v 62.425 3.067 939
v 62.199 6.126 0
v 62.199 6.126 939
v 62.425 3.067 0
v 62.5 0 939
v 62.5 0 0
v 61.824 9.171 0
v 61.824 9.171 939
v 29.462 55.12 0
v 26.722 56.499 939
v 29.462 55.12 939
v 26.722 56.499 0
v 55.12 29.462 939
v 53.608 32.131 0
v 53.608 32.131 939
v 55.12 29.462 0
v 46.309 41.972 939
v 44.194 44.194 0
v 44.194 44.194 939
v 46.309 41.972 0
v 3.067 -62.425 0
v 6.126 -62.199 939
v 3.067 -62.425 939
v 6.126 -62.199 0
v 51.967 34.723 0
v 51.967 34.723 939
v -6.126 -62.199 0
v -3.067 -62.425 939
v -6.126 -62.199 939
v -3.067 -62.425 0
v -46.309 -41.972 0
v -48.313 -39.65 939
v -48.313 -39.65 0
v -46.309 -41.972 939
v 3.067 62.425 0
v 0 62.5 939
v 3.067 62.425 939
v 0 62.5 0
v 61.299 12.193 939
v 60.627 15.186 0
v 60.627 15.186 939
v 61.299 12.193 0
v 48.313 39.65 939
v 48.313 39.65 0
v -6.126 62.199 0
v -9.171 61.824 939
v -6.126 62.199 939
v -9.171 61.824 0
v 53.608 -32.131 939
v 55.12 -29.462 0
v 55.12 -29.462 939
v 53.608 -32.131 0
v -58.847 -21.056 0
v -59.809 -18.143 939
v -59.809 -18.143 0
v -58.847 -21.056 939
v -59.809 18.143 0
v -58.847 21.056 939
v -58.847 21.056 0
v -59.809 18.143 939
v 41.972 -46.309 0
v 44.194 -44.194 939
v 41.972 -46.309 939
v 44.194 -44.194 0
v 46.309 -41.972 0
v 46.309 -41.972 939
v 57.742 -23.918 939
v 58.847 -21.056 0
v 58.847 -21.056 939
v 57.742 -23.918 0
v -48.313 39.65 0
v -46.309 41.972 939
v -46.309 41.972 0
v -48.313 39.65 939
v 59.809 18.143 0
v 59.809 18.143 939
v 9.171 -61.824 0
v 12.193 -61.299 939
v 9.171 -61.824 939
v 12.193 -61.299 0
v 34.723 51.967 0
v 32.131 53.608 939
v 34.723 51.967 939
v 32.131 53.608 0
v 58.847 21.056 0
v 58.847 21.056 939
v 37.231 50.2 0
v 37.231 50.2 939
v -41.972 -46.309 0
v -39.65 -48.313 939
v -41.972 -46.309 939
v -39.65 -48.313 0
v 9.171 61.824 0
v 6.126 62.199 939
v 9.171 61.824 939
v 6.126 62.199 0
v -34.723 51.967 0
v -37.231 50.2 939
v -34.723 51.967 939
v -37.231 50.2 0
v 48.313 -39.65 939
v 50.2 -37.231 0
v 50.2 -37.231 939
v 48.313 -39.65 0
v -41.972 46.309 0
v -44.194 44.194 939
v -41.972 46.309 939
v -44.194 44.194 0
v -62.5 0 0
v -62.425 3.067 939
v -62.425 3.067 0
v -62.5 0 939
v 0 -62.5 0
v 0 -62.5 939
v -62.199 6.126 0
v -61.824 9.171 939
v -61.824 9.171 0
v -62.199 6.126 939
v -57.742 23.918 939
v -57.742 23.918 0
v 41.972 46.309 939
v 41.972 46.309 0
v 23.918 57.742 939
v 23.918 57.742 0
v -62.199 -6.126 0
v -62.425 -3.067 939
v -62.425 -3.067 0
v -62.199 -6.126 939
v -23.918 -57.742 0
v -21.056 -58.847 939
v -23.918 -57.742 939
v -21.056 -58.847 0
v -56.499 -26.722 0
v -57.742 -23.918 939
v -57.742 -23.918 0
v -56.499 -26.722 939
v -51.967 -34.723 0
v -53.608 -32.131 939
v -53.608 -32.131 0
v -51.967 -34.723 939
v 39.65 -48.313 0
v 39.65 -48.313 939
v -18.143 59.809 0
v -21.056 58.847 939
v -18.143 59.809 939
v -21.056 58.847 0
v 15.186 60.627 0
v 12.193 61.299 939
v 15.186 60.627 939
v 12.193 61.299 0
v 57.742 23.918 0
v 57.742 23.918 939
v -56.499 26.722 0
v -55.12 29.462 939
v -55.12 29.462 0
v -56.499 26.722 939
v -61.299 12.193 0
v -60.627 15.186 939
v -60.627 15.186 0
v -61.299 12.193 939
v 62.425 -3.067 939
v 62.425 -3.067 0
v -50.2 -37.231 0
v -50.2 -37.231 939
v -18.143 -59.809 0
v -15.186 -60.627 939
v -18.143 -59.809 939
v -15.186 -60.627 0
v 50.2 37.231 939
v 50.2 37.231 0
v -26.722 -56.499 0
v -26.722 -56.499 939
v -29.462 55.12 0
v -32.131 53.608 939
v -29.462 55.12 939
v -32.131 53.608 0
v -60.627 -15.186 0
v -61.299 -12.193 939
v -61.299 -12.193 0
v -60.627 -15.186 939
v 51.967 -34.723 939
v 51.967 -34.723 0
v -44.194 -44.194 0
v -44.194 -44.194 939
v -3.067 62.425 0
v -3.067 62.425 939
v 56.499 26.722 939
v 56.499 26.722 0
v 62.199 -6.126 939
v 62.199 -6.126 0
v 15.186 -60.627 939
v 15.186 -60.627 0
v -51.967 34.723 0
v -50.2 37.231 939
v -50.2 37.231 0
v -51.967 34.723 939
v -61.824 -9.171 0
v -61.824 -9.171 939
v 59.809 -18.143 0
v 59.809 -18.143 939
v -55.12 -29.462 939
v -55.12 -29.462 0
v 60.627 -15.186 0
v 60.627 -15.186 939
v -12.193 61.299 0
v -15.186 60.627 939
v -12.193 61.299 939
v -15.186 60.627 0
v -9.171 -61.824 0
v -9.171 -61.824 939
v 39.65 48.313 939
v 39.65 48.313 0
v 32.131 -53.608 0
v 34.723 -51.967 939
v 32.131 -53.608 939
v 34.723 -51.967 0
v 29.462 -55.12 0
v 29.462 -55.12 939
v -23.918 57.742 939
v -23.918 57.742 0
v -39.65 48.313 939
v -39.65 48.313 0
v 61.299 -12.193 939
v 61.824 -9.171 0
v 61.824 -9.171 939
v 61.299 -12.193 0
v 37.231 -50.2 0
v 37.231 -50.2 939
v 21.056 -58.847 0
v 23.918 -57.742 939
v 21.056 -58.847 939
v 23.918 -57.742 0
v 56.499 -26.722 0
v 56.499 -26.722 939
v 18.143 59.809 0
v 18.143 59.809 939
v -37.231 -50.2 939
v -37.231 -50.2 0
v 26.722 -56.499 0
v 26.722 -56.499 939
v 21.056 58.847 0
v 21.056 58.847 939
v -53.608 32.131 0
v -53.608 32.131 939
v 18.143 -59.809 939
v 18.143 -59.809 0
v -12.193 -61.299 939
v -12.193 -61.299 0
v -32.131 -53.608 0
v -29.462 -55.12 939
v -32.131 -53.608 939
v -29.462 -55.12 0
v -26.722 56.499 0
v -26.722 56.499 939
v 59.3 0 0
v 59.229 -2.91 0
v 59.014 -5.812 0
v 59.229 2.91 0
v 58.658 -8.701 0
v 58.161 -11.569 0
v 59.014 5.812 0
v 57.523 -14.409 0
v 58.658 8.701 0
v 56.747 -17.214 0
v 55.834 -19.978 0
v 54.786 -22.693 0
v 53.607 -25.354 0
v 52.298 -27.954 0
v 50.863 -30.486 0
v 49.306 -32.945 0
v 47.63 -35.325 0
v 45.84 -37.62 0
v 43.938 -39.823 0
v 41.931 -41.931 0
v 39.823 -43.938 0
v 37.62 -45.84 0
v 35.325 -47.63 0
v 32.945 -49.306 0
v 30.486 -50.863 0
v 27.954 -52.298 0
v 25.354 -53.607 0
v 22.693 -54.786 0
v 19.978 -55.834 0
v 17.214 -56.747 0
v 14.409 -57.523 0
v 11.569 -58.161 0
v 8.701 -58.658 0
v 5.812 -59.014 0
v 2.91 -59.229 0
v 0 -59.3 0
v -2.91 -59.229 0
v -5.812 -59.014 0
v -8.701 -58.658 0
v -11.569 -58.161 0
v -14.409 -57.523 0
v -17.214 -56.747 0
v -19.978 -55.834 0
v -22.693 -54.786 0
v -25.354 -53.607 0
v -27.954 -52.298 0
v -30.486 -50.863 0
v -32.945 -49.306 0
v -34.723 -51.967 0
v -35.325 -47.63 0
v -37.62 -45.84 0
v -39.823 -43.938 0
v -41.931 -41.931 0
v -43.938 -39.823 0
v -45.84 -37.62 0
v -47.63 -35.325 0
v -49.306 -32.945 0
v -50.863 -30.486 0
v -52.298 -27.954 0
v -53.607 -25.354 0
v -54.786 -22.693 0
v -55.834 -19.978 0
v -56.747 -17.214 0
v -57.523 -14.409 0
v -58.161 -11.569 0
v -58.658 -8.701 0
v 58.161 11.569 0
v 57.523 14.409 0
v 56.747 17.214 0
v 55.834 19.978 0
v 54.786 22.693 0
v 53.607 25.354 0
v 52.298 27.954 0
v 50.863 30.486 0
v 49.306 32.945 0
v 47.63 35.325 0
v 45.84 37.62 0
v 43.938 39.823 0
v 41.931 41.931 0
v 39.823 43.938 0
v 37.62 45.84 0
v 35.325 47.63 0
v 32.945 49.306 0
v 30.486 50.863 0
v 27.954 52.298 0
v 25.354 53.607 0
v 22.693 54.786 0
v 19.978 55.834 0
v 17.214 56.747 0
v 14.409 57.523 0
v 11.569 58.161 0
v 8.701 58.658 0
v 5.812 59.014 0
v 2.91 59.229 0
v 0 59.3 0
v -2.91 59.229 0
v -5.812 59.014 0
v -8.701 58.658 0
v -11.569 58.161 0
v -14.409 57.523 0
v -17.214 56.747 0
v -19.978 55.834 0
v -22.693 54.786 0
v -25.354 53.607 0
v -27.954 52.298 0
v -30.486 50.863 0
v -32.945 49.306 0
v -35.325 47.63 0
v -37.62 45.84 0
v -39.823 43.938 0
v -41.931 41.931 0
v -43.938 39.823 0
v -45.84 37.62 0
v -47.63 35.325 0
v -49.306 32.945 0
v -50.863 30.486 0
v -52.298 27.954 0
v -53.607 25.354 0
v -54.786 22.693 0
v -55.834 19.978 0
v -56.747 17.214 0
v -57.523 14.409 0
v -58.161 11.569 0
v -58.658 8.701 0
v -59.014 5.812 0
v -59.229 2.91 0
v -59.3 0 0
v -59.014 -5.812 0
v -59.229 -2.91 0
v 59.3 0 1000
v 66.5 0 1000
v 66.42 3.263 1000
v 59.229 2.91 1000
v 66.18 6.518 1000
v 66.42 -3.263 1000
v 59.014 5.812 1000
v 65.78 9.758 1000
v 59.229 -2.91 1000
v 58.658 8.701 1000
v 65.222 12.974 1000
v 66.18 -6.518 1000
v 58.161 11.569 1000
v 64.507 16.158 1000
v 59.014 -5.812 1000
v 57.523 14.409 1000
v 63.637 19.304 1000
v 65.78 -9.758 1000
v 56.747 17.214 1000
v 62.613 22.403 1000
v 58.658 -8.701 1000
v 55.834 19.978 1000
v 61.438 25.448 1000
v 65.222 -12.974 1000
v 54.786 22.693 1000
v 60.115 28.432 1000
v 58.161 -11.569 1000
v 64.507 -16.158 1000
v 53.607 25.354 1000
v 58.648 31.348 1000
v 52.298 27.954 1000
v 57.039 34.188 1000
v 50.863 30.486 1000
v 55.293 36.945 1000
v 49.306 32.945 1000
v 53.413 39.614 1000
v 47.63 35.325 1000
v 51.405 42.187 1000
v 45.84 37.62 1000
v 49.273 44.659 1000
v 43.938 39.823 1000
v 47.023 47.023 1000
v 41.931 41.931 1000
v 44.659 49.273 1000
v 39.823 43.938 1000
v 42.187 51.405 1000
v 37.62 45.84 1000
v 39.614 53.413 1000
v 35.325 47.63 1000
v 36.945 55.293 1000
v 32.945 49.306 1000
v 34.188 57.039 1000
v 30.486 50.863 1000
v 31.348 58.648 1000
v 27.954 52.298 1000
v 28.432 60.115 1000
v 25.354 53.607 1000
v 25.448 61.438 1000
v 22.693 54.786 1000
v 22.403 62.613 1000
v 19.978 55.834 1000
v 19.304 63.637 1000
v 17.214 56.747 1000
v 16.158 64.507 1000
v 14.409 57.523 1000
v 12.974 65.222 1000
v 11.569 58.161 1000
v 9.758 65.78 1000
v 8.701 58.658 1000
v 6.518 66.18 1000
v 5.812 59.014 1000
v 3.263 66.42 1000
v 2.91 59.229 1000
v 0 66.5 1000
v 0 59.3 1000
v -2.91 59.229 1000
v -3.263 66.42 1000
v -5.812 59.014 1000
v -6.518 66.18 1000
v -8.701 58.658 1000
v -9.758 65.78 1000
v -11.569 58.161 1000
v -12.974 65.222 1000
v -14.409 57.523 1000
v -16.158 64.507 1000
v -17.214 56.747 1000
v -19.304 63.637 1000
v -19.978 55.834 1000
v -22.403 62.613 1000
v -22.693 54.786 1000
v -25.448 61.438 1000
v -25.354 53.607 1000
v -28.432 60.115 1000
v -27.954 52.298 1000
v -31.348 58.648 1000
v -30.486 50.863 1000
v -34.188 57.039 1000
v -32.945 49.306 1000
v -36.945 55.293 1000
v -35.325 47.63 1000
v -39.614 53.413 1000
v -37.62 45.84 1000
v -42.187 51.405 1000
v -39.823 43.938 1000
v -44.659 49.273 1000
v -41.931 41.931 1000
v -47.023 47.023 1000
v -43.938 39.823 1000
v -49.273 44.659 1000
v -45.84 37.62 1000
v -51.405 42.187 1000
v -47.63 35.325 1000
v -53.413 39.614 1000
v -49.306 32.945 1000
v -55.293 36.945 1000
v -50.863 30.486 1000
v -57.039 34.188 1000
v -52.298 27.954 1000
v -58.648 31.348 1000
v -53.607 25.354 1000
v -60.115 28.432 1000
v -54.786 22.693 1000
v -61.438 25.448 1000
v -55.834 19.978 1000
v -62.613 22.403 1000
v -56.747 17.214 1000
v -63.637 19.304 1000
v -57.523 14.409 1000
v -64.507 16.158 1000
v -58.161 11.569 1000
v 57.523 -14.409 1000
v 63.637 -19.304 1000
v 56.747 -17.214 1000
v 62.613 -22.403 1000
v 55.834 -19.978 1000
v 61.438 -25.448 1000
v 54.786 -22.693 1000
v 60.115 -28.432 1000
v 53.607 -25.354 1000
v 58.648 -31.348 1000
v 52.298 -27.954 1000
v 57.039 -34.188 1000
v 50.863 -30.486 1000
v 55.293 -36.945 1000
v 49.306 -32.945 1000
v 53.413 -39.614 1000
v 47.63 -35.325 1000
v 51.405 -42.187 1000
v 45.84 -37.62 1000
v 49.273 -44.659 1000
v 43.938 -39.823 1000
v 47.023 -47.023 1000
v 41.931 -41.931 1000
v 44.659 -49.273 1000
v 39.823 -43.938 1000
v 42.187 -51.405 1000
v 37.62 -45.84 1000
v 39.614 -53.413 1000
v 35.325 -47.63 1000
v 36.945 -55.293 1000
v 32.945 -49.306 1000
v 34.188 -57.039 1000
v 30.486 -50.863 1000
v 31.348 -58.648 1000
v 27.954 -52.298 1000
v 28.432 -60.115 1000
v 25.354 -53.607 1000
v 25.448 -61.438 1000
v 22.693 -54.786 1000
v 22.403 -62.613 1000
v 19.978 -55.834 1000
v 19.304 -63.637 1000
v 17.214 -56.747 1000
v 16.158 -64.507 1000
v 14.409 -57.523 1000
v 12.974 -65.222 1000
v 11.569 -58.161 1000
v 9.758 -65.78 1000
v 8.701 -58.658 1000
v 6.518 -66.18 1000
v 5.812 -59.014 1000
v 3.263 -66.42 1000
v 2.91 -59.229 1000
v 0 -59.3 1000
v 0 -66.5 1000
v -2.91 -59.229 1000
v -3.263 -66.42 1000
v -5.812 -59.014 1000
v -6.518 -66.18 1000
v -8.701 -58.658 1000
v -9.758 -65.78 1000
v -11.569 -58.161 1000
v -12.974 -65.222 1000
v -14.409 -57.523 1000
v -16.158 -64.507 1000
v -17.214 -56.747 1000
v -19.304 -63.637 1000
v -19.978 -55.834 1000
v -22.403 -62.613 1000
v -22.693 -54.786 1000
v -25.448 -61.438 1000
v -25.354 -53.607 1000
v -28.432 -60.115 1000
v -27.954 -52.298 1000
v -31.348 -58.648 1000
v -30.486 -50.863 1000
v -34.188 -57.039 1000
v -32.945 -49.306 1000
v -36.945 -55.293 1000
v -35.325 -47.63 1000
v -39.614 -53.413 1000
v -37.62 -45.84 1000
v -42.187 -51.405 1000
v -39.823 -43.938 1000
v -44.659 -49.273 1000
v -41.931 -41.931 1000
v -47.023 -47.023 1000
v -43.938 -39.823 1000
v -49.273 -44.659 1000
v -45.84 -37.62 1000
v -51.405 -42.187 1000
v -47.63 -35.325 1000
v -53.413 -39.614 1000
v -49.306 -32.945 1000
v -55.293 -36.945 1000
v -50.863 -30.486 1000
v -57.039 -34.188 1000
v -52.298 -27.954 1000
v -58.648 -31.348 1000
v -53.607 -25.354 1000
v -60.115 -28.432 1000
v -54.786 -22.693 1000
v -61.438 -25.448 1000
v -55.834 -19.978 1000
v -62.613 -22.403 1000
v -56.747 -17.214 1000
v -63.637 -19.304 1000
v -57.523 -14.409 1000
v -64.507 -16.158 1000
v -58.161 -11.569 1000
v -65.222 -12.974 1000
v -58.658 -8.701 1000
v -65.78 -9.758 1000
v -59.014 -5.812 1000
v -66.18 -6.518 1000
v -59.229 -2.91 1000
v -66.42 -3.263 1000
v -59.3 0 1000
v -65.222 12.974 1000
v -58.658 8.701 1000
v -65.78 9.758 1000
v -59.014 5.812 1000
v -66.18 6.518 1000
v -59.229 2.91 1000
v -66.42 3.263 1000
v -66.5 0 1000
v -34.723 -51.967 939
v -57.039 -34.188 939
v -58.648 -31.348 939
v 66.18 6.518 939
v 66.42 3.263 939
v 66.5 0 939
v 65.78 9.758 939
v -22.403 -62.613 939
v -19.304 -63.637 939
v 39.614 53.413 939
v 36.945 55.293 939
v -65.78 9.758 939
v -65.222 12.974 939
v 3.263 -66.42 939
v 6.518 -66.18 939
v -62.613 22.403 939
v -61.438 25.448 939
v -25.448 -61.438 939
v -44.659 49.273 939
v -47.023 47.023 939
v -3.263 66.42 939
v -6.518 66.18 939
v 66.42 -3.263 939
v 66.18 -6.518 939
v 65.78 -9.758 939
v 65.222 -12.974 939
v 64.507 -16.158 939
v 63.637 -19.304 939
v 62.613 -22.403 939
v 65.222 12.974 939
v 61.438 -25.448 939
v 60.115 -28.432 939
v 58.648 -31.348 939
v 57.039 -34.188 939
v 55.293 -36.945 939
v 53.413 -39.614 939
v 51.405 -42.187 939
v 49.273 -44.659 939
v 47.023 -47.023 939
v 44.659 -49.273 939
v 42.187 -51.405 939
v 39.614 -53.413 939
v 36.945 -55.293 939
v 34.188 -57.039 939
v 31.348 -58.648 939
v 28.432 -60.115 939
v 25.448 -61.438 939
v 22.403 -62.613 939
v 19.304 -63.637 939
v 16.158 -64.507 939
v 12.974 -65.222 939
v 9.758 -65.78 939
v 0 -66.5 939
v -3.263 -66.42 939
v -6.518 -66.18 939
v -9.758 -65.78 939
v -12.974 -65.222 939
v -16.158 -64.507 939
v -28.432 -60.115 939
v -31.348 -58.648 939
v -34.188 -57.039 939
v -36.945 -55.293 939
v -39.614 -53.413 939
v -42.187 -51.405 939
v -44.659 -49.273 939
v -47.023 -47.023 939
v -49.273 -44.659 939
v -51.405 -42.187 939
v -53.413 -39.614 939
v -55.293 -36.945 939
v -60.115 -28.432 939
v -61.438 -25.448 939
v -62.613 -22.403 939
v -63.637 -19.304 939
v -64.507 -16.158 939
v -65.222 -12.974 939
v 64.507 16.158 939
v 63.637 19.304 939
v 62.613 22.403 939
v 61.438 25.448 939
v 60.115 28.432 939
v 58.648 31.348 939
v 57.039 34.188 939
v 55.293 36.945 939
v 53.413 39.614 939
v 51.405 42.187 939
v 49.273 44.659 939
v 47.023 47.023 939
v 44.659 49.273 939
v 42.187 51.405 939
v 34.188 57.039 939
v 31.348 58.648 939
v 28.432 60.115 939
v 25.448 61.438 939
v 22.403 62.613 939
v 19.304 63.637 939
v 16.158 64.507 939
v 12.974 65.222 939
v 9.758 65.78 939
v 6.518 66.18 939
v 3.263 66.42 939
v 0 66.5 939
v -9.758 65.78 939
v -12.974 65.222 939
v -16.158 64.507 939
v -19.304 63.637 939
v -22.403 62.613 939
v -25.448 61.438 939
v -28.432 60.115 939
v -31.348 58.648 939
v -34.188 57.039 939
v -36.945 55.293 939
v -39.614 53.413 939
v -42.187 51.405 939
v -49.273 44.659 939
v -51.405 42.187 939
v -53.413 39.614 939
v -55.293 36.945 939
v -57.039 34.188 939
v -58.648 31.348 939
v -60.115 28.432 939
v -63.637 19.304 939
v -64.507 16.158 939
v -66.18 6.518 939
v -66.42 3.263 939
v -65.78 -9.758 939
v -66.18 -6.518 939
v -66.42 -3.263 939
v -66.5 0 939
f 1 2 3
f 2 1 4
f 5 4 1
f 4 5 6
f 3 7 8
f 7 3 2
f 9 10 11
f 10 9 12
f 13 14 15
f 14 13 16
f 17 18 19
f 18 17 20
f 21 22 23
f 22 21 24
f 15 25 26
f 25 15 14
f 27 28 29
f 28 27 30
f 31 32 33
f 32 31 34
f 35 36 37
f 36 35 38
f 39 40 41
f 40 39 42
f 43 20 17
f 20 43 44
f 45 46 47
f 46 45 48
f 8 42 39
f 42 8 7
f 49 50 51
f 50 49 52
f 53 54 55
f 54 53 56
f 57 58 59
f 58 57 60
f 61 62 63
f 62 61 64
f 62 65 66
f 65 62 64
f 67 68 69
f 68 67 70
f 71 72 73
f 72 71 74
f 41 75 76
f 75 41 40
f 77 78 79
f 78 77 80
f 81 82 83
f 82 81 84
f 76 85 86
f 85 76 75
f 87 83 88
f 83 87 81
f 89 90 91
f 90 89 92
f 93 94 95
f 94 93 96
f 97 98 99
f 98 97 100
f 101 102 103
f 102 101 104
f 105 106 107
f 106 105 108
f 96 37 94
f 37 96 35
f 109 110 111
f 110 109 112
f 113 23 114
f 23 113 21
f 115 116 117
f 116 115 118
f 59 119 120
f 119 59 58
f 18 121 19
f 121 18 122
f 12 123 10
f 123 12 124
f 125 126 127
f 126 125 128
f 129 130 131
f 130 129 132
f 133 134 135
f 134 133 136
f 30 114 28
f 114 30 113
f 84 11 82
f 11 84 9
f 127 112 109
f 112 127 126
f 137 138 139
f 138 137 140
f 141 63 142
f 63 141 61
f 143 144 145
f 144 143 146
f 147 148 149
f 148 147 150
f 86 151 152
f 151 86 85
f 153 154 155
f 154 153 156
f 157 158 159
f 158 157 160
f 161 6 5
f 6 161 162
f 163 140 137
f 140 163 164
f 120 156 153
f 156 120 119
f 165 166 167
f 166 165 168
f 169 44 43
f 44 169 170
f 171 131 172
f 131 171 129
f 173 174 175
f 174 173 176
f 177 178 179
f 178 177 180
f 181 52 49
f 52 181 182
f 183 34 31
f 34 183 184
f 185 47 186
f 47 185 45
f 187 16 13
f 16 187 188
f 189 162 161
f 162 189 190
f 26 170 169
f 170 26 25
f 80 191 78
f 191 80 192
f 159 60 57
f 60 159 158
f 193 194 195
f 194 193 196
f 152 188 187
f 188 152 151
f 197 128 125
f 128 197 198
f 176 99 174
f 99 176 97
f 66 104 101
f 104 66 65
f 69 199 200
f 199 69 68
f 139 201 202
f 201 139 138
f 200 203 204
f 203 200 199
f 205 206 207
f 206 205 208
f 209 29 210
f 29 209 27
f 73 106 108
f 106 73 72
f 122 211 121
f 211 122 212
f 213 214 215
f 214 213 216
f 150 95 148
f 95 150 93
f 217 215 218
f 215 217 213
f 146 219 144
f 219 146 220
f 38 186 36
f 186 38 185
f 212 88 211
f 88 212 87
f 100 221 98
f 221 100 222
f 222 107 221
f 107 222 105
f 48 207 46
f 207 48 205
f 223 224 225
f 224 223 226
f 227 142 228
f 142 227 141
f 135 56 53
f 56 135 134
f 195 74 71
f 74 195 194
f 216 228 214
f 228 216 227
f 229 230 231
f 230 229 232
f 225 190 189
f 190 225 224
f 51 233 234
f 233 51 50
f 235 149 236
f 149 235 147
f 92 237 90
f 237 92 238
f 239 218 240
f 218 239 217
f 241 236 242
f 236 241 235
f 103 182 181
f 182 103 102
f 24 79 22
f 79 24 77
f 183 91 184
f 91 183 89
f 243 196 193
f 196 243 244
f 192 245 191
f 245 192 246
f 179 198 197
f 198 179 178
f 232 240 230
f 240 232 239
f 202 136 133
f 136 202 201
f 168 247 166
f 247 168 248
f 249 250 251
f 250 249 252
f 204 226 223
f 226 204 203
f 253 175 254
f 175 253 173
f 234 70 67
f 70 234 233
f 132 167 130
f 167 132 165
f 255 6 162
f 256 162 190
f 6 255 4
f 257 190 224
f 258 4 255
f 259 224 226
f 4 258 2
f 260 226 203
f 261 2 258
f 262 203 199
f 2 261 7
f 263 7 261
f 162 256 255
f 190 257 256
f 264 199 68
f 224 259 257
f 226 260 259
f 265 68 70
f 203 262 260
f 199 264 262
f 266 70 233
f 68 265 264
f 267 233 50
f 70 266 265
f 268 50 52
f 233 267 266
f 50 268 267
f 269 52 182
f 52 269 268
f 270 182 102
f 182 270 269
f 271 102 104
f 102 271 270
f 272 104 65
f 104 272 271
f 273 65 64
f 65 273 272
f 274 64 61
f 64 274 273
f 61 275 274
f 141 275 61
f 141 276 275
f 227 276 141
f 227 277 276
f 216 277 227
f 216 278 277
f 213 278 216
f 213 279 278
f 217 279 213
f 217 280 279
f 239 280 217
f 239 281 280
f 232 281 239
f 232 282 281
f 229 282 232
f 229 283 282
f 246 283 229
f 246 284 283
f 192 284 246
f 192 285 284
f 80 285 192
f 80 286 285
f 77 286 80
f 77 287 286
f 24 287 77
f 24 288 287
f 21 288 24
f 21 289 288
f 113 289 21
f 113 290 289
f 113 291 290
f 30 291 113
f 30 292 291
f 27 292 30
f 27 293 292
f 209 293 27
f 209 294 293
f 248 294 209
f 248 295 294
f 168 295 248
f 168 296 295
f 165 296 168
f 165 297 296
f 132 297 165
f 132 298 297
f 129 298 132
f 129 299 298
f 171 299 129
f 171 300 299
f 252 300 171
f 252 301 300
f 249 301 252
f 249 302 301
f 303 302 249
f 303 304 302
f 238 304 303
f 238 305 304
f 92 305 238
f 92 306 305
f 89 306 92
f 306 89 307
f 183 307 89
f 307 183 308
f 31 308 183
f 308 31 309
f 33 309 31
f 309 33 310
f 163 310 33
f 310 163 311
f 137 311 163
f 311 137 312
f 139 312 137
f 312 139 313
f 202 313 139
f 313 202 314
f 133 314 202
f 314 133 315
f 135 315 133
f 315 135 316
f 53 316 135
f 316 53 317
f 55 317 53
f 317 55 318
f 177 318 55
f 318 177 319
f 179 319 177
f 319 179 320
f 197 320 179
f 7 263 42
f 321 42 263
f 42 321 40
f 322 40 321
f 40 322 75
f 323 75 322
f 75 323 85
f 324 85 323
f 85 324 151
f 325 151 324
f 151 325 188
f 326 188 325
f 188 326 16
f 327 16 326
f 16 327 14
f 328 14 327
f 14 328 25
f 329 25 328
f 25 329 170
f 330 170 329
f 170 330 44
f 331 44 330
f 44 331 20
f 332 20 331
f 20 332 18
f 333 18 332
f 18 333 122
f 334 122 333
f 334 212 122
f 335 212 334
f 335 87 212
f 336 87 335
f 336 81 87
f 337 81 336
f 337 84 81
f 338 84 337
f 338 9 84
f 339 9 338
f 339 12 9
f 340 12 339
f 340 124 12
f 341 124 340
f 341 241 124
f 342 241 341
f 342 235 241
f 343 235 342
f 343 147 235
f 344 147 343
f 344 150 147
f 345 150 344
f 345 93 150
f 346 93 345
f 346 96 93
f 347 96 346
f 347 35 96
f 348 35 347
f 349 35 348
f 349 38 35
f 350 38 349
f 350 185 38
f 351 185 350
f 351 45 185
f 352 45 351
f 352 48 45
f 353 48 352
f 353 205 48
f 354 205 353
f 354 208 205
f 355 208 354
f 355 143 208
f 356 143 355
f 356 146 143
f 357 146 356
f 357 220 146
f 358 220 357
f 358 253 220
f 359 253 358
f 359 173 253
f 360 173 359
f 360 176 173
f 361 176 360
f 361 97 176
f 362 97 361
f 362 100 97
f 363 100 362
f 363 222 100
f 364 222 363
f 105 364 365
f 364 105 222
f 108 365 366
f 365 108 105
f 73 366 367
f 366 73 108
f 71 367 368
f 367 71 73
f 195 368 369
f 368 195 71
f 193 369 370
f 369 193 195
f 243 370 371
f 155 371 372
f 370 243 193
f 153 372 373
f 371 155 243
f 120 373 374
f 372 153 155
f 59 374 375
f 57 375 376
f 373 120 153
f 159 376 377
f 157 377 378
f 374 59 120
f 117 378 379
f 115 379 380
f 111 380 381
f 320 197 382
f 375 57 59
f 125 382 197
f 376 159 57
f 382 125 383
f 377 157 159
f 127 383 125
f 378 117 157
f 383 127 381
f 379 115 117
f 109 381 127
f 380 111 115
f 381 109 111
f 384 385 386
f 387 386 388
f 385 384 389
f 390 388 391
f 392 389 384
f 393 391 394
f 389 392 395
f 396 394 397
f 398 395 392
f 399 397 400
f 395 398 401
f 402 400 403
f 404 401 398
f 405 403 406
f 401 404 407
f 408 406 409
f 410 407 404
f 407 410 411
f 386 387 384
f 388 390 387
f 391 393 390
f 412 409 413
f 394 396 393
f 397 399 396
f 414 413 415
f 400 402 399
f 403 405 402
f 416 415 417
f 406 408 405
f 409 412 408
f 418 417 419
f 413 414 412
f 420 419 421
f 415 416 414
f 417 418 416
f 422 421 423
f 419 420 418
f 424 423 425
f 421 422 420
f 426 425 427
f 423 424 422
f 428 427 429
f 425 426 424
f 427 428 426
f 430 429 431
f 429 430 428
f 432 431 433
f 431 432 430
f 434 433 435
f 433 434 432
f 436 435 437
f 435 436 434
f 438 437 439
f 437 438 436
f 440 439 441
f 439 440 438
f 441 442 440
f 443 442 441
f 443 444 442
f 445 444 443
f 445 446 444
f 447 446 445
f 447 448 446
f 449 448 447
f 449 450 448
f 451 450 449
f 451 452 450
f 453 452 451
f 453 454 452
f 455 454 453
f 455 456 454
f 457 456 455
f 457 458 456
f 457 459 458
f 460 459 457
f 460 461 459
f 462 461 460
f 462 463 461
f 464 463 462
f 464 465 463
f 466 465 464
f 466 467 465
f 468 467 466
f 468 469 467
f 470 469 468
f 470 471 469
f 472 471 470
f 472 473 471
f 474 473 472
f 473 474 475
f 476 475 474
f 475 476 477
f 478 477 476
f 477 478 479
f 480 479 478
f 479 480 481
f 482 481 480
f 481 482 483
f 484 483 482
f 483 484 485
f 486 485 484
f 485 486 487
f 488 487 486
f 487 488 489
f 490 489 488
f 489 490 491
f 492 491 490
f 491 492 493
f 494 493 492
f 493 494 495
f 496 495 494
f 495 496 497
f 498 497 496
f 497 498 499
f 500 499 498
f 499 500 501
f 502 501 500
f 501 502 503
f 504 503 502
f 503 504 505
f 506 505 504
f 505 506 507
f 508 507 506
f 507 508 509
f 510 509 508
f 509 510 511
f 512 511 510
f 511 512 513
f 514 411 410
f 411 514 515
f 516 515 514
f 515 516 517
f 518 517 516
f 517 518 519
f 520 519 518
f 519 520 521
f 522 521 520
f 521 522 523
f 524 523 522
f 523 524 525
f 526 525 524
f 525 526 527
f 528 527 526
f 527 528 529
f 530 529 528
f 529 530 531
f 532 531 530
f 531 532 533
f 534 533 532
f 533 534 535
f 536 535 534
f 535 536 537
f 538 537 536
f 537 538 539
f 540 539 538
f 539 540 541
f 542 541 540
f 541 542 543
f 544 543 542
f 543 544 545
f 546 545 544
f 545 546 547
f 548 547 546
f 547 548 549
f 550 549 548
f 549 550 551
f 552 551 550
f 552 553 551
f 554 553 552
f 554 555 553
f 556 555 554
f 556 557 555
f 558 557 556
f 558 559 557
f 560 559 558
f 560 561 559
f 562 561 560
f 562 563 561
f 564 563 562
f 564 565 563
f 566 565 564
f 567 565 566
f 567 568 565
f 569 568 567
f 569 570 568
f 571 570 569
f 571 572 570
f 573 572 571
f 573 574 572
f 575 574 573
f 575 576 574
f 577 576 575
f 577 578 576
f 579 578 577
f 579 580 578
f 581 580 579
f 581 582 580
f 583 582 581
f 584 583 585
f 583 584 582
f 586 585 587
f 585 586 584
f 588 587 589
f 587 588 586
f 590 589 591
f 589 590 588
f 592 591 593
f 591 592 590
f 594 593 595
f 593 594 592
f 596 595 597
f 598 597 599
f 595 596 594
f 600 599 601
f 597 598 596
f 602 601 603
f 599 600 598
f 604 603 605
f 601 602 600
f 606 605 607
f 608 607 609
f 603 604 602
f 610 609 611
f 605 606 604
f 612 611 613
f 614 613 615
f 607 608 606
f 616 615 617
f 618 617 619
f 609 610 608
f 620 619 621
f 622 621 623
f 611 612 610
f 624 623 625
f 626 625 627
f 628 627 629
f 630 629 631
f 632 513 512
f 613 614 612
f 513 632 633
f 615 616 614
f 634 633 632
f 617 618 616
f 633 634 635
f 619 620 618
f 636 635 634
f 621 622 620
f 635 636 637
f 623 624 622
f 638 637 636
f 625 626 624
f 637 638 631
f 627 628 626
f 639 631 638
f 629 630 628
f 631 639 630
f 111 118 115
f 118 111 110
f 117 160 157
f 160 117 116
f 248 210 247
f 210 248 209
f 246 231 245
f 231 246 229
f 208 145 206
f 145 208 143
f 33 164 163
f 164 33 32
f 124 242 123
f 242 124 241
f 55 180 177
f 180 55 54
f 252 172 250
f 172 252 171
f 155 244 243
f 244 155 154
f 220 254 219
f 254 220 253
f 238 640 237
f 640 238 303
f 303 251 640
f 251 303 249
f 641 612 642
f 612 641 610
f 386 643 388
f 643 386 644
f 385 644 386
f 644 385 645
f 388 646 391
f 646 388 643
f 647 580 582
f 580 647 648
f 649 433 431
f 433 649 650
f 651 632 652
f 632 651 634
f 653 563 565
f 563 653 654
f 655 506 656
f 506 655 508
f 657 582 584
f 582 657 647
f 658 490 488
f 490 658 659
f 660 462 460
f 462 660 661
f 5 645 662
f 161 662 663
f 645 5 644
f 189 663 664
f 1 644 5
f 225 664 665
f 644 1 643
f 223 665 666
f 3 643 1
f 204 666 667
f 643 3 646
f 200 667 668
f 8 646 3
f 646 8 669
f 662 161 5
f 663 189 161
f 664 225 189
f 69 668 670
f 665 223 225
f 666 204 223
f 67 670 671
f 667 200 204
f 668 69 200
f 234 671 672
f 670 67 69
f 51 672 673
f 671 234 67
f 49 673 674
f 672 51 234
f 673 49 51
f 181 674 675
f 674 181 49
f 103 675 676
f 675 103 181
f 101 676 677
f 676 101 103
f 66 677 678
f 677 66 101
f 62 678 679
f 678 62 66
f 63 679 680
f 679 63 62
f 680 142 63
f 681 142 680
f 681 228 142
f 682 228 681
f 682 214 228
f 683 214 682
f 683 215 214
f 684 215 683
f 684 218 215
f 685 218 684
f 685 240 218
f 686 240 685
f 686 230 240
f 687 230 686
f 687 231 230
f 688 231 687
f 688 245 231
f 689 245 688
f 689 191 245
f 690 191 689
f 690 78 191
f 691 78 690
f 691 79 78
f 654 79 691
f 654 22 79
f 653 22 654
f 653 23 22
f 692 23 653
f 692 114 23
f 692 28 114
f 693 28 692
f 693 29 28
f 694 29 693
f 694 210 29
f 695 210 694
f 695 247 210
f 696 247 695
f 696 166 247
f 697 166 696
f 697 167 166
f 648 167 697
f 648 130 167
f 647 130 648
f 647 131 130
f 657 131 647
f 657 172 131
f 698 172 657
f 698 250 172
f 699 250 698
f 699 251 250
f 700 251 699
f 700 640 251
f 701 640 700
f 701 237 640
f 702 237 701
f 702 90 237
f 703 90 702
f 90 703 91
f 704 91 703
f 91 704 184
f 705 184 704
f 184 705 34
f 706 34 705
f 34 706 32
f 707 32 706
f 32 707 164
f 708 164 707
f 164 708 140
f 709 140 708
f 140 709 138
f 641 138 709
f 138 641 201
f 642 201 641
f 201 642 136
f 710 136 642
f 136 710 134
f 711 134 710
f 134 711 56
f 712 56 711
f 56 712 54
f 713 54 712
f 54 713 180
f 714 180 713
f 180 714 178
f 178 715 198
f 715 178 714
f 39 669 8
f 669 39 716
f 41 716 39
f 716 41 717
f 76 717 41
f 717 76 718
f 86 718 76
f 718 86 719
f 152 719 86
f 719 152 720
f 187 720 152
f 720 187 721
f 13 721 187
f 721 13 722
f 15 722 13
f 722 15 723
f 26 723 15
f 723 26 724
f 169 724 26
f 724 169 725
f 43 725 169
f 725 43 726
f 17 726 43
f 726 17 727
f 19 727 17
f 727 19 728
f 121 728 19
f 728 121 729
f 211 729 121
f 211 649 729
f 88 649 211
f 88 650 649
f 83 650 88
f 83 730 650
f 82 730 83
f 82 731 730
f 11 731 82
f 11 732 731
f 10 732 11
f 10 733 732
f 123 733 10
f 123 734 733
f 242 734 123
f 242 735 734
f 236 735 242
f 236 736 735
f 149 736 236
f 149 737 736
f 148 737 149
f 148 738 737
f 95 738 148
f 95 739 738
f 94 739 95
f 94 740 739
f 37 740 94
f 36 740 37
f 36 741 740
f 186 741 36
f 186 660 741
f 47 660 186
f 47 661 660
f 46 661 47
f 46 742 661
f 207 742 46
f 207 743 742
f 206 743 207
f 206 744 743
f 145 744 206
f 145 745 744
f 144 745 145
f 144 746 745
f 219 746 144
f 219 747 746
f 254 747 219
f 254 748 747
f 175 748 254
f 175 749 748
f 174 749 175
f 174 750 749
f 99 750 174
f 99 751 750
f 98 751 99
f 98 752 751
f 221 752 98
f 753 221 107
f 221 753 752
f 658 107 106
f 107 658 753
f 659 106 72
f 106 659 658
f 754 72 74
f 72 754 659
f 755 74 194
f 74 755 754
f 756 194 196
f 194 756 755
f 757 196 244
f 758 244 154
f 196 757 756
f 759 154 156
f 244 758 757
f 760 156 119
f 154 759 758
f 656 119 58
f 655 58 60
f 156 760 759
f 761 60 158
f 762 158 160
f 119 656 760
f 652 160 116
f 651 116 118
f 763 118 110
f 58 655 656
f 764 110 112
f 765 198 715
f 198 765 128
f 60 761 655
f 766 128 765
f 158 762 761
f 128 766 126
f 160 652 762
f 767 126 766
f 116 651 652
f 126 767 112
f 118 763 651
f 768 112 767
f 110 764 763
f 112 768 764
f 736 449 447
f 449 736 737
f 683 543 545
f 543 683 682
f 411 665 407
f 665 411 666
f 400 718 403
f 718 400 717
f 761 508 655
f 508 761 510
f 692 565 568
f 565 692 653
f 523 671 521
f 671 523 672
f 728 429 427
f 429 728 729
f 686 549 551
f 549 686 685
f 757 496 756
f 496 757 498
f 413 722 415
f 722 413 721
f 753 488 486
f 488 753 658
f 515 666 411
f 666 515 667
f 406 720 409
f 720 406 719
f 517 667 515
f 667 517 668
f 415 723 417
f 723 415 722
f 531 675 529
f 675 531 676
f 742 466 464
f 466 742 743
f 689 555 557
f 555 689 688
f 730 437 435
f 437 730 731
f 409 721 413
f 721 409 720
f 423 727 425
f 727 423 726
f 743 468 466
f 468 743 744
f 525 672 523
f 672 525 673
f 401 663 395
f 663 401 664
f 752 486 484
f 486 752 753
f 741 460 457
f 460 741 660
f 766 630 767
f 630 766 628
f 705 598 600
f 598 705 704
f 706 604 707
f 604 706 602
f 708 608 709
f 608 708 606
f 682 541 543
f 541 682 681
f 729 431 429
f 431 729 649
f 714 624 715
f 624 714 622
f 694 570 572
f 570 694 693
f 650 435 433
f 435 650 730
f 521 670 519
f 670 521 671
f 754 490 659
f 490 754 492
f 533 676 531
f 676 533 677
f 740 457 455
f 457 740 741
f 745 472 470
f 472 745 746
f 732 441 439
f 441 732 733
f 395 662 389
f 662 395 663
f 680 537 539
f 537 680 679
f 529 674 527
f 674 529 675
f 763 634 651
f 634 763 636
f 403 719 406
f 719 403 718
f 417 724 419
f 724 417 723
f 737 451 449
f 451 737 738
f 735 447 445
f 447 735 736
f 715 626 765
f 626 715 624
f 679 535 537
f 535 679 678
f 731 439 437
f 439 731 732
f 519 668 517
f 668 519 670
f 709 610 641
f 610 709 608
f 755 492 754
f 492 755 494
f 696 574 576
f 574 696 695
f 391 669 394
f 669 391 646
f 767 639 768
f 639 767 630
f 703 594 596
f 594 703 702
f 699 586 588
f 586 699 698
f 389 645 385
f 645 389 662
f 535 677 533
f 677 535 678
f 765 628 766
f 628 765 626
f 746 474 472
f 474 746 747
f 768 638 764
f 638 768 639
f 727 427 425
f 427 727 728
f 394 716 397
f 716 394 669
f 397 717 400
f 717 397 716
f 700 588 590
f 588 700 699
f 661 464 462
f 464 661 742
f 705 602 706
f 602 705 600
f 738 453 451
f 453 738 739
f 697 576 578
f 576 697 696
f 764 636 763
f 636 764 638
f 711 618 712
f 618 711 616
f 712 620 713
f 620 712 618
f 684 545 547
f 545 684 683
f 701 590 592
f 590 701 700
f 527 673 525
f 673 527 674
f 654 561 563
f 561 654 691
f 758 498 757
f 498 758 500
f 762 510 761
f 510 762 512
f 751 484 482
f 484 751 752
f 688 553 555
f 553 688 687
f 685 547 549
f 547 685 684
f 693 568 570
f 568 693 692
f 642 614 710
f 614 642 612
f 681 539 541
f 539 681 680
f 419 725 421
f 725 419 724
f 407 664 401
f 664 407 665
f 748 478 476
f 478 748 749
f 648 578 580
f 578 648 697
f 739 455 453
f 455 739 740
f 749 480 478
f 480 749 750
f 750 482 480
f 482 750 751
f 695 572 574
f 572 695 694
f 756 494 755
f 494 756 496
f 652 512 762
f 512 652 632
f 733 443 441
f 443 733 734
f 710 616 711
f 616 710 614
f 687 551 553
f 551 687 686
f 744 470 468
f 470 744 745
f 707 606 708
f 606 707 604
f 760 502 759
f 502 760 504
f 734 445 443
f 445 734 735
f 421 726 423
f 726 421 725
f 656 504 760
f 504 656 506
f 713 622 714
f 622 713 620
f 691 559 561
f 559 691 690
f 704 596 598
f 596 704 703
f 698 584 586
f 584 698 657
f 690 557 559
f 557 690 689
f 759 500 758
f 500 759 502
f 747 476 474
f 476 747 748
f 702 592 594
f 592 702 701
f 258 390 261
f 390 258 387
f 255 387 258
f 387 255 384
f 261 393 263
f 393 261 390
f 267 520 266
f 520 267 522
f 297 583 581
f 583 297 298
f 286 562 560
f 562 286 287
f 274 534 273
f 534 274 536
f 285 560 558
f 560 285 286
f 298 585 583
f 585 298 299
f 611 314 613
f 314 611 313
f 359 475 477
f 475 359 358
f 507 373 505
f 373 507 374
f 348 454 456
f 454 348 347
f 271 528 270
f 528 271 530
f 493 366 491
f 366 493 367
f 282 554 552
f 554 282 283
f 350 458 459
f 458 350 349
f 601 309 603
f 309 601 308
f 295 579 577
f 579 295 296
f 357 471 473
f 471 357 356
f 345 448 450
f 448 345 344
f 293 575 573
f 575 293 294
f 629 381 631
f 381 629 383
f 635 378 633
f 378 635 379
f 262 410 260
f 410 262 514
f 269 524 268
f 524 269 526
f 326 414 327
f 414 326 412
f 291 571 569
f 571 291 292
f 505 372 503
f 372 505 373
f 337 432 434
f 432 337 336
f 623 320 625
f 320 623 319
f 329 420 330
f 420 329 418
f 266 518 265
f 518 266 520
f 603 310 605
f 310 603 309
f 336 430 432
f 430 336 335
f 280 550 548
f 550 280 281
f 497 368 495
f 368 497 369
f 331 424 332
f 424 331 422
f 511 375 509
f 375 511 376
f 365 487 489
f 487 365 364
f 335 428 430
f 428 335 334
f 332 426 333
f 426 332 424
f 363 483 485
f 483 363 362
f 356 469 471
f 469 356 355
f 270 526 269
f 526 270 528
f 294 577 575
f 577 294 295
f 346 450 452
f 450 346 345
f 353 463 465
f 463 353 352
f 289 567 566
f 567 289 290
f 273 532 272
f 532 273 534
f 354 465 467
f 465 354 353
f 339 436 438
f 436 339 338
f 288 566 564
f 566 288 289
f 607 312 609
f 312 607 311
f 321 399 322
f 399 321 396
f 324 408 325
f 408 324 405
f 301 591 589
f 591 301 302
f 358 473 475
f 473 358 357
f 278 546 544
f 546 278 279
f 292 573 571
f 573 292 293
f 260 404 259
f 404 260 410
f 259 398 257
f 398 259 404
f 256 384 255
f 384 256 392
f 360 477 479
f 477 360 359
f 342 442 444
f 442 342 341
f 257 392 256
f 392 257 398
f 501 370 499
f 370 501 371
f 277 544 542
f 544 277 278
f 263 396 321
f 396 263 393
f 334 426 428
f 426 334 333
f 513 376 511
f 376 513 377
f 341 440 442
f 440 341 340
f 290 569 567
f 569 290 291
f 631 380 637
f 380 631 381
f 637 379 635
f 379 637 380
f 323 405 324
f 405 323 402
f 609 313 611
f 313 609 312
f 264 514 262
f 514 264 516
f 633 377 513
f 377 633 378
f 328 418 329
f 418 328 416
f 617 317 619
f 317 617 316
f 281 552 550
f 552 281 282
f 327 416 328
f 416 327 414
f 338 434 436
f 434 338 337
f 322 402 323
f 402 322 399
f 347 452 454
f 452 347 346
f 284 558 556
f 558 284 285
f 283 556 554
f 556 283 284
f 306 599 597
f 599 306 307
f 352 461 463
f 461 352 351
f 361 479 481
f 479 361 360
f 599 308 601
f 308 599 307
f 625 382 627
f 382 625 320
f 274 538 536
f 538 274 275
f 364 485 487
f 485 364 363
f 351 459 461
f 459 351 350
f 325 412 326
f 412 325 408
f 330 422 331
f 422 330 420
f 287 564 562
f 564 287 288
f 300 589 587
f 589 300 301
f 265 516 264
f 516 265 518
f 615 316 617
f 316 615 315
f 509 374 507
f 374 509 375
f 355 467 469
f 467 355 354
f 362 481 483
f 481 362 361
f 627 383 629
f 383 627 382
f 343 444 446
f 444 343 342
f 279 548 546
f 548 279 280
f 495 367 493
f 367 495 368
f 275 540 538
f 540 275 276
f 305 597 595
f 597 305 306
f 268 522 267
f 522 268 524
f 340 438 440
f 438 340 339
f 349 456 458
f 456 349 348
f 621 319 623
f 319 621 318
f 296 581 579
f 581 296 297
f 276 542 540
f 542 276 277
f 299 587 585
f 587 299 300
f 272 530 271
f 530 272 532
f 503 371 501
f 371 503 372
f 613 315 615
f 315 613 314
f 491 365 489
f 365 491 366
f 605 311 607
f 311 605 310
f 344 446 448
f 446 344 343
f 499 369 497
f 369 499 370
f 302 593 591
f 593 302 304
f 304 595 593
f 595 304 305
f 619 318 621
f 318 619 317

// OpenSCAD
// HT 125 pipe 1000 mm (single connected solid)

// Parameters
nominal_diameter_mm = 125; //[60:250:1]
length_mm = 1000; //[500:2000:10]
pipe_wall_thickness = 3.2; //[1.6:6.4:0.1]
end_fitting_length = 60; //[30:120:1]
end_fitting_radial_thickness = 4; //[2:10:0.5]
overlap_mm = 1; //[0.5:2:0.1]

$fn = 128;

module ht_pipe() {
    outer_r = nominal_diameter_mm/2;
    inner_r = max(outer_r - pipe_wall_thickness, 0.01);

    socket_outer_r = outer_r + end_fitting_radial_thickness;

    // Small epsilon to avoid coplanar/zero-thickness artifacts
    eps = 0.2;

    // Socket placement at the "top" end, with overlap into the main pipe for connectivity
    socket_z0 = length_mm - end_fitting_length;
    socket_z0_overlap = socket_z0 - overlap_mm;
    socket_h = end_fitting_length + overlap_mm;

    color([0.85, 0.85, 0.8])
    difference() {
        // Outer solid: main pipe + socket (connected via overlap)
        union() {
            cylinder(r=outer_r, h=length_mm, center=false);

            translate([0, 0, socket_z0_overlap])
                cylinder(r=socket_outer_r, h=socket_h, center=false);
        }

        // Inner void: bore through entire pipe AND through socket region
        // (extend slightly beyond ends to ensure clean subtraction)
        translate([0, 0, -eps])
            cylinder(r=inner_r, h=length_mm + 2*eps, center=false);
    }
}

ht_pipe();
